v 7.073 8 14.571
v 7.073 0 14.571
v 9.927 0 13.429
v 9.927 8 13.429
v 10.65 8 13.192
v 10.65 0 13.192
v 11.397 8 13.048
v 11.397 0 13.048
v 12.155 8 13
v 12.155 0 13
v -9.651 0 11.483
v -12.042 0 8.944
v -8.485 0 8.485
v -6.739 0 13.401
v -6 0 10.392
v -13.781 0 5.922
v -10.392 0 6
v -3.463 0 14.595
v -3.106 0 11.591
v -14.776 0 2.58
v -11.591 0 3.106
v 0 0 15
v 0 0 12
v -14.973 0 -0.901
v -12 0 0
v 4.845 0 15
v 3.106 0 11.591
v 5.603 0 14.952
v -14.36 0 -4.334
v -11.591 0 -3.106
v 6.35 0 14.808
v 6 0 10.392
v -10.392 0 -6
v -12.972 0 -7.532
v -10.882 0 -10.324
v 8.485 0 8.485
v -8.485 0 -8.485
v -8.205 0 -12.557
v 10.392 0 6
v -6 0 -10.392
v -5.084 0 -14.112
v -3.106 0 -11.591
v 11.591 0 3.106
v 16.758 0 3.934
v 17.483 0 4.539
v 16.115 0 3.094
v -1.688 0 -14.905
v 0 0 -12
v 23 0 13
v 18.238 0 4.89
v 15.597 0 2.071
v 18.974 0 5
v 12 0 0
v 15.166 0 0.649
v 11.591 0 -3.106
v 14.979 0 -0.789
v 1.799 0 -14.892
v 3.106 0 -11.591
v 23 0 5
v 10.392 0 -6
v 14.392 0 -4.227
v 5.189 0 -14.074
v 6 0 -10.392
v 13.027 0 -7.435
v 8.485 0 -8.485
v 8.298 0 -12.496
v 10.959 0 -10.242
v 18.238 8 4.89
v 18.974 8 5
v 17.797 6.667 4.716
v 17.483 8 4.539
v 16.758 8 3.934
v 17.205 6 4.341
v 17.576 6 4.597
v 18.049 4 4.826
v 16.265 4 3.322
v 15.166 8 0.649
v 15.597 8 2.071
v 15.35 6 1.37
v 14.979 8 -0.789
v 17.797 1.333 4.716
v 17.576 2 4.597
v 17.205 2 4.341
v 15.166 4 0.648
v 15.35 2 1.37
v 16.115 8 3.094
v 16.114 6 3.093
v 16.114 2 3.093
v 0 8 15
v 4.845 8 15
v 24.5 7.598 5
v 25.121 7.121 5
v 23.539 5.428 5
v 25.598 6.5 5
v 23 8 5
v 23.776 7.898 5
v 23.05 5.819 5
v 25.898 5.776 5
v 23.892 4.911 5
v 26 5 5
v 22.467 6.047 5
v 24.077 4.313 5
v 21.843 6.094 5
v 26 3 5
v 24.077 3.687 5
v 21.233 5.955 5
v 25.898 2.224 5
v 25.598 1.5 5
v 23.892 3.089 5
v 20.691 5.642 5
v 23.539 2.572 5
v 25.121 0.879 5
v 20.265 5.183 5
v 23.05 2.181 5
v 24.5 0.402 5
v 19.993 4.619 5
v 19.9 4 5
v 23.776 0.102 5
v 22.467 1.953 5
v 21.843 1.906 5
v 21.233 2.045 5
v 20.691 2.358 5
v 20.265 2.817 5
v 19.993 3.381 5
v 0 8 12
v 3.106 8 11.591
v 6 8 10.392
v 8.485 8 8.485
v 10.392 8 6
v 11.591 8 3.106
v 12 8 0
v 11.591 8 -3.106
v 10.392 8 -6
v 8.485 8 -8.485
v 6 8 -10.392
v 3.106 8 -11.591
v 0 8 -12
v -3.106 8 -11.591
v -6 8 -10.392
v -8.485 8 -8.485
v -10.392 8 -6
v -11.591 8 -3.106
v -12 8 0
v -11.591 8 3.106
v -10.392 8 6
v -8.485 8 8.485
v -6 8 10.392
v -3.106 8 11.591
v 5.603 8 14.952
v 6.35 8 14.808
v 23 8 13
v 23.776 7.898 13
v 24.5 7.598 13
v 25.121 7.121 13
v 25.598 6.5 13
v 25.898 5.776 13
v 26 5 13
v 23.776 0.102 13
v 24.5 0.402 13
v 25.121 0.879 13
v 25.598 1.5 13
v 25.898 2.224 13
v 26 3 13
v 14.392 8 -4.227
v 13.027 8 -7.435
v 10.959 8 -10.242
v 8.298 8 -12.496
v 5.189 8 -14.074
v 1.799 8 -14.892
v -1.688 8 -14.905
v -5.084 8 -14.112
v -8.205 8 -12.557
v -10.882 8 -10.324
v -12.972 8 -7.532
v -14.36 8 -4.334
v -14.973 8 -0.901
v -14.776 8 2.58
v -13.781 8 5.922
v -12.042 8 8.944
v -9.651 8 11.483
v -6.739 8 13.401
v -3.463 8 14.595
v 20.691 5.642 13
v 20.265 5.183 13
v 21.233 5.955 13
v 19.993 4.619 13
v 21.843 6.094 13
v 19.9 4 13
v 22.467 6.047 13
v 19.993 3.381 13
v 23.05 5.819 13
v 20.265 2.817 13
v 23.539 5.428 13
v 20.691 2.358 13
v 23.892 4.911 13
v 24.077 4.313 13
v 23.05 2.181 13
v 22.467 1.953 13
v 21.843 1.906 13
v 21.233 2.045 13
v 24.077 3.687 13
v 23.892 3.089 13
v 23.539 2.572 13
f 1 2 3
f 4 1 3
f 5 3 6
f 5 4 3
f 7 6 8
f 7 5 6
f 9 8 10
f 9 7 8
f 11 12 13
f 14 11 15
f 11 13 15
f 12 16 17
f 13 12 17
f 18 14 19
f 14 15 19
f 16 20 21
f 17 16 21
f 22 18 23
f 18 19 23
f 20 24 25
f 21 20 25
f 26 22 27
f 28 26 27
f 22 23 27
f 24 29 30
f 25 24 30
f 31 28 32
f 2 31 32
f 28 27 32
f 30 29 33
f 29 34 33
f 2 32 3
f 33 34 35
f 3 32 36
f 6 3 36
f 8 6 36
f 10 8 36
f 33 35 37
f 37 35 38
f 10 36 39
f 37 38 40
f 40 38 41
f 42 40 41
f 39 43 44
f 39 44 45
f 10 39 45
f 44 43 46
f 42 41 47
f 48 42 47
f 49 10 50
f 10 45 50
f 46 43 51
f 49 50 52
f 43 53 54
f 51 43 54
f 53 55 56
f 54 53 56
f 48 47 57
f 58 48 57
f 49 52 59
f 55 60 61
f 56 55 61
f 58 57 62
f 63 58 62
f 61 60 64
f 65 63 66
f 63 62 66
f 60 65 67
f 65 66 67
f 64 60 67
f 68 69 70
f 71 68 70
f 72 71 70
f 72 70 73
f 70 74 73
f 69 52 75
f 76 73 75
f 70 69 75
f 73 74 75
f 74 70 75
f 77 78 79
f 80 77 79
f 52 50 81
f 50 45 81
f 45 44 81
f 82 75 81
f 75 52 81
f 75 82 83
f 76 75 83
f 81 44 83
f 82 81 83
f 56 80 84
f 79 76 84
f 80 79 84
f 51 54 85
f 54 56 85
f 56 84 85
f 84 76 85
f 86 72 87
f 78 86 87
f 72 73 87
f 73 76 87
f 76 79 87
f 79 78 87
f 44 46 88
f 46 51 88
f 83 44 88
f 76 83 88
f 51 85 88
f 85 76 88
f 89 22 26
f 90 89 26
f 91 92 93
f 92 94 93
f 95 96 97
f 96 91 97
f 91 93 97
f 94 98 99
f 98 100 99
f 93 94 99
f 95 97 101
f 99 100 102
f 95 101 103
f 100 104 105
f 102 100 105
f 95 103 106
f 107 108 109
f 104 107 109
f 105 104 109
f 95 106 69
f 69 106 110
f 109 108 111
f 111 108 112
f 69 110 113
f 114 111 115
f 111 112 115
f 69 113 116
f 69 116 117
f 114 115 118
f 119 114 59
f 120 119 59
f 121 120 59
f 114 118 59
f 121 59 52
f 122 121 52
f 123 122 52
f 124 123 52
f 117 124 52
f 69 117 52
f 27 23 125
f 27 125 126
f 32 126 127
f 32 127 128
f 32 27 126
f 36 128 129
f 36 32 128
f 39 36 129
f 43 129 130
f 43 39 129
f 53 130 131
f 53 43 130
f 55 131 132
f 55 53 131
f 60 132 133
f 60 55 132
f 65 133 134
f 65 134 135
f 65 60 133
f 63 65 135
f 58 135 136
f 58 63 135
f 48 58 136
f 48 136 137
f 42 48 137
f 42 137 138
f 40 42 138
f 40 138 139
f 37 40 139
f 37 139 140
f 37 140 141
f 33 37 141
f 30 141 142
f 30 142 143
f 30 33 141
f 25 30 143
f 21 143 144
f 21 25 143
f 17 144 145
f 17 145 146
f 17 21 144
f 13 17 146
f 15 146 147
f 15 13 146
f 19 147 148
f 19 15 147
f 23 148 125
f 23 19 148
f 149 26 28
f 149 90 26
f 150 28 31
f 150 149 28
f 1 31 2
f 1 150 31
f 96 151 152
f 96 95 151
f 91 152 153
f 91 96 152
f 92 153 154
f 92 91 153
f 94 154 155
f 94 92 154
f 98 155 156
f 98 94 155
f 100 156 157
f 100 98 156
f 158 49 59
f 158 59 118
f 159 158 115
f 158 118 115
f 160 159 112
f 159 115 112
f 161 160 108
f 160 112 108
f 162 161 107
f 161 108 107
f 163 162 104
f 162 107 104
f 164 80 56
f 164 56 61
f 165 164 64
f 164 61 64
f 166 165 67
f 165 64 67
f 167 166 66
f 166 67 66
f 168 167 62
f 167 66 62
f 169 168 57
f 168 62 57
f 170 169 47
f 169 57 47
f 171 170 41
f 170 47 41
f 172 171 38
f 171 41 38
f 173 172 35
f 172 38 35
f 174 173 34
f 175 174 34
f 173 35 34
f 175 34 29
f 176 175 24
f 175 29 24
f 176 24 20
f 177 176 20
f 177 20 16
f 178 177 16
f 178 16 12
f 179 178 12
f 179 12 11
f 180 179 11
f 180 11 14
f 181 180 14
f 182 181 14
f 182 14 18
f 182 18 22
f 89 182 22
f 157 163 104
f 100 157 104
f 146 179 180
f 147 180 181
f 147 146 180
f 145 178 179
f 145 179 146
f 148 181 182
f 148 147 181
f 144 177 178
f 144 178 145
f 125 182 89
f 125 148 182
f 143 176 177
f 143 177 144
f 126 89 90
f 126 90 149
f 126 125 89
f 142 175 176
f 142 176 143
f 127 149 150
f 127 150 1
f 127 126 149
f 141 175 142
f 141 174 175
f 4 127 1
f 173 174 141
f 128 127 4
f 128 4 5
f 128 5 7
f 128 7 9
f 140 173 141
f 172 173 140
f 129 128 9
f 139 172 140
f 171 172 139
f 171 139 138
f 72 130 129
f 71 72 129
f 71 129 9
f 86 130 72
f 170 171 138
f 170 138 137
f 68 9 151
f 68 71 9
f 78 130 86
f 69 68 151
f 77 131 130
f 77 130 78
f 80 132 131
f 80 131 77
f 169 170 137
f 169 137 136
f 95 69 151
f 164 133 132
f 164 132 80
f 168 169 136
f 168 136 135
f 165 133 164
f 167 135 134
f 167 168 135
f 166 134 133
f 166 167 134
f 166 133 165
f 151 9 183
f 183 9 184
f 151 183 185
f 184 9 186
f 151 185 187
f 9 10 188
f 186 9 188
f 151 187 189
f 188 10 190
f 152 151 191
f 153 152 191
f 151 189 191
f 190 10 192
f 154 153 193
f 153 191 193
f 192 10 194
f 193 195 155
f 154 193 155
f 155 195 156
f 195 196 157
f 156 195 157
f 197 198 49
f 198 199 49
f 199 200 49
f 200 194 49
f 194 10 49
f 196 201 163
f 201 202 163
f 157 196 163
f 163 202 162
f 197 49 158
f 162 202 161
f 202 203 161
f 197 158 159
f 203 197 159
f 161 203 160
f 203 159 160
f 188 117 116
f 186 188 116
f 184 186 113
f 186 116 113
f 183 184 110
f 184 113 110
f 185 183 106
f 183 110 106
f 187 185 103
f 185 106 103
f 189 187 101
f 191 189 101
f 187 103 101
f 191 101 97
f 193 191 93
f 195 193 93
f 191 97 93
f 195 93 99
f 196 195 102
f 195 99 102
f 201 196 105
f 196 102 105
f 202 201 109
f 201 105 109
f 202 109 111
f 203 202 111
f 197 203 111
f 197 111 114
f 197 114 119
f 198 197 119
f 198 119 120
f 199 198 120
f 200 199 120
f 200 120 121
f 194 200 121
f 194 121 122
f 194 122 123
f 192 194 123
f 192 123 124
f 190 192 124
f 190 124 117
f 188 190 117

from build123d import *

# Parameters (mm, degrees)
SKETCH1_R           = 12
BOSS_EXTRUDE1_DEPTH = 8
FILLET2_R           = 6
SKETCH2_R           = 2.1
CUT_EXTRUDE1_DEPTH  = 34.763886032
FILLET3_DEPTH       = 8
FILLET4_R           = 3


with BuildPart() as part:
    # Sketch1 → Boss-Extrude1 (new body)
    with BuildSketch(Plane(origin=(0, 0, 0), x_dir=(1, 0, 0), z_dir=(0, 1, 0))):
        with BuildLine():
            Line((0, -15), (6, -15))
            Line((6, -15), (11, -13))
            Line((11, -13), (26, -13))
            Line((26, -13), (26, -5))
            Line((26, -5), (15, -5))
            Line((15, -5), (15, 0))
            ThreePointArc((15, 0), (-10.606601718, 10.606601718), (0, -15))
        make_face()
        with Locations(Location((0, 0, 0), (0, 0, 270))):
            Circle(SKETCH1_R, mode=Mode.SUBTRACT)
    extrude(amount=BOSS_EXTRUDE1_DEPTH)

    # Fillet2
    fillet2_edges = [part.edges().sort_by_distance(p)[0] for p in [
        (11, 4, 13),
        (6, 4, 15),
    ]]
    fillet(fillet2_edges, radius=FILLET2_R)

    # Sketch2 → Cut-Extrude1 (cut, through all)
    with BuildSketch(Plane(origin=(0, 0, 5), x_dir=(-1, 0, 0), z_dir=(0, 0, -1))):
        with Locations((-22, 4)):
            Circle(SKETCH2_R)
    extrude(amount=-CUT_EXTRUDE1_DEPTH, mode=Mode.SUBTRACT)

    # Fillet3: read off the stored shape, not the designer's step
    # Fillet3 outline → Fillet3 (add)
    with BuildSketch(Plane(origin=(0, 0, 0), x_dir=(1, 0, 0), z_dir=(0, 1, 0))):
        with BuildLine():
            Line((15, -5), (18.973665961, -5))
            add(Edge.make_bspline(
                [(18.973665961, -5), (15.284342024, -5), (14.979209969, 0.789473684)],
                knots=[0, 0, 0, 1, 1, 1], degree=2, weights=[1, 0.72547625, 1]))
            ThreePointArc((14.979209969, 0.789473684), (14.994801592, 0.39487369), (15, 0))
            Line((15, 0), (15, -5))
        make_face()
    extrude(amount=FILLET3_DEPTH)

    # Fillet4
    fillet4_edges = [part.edges().sort_by_distance(p)[0] for p in [
        (26, 0, 9),
        (26, 8, 9),
    ]]
    fillet(fillet4_edges, radius=FILLET4_R)


solid = part.part
